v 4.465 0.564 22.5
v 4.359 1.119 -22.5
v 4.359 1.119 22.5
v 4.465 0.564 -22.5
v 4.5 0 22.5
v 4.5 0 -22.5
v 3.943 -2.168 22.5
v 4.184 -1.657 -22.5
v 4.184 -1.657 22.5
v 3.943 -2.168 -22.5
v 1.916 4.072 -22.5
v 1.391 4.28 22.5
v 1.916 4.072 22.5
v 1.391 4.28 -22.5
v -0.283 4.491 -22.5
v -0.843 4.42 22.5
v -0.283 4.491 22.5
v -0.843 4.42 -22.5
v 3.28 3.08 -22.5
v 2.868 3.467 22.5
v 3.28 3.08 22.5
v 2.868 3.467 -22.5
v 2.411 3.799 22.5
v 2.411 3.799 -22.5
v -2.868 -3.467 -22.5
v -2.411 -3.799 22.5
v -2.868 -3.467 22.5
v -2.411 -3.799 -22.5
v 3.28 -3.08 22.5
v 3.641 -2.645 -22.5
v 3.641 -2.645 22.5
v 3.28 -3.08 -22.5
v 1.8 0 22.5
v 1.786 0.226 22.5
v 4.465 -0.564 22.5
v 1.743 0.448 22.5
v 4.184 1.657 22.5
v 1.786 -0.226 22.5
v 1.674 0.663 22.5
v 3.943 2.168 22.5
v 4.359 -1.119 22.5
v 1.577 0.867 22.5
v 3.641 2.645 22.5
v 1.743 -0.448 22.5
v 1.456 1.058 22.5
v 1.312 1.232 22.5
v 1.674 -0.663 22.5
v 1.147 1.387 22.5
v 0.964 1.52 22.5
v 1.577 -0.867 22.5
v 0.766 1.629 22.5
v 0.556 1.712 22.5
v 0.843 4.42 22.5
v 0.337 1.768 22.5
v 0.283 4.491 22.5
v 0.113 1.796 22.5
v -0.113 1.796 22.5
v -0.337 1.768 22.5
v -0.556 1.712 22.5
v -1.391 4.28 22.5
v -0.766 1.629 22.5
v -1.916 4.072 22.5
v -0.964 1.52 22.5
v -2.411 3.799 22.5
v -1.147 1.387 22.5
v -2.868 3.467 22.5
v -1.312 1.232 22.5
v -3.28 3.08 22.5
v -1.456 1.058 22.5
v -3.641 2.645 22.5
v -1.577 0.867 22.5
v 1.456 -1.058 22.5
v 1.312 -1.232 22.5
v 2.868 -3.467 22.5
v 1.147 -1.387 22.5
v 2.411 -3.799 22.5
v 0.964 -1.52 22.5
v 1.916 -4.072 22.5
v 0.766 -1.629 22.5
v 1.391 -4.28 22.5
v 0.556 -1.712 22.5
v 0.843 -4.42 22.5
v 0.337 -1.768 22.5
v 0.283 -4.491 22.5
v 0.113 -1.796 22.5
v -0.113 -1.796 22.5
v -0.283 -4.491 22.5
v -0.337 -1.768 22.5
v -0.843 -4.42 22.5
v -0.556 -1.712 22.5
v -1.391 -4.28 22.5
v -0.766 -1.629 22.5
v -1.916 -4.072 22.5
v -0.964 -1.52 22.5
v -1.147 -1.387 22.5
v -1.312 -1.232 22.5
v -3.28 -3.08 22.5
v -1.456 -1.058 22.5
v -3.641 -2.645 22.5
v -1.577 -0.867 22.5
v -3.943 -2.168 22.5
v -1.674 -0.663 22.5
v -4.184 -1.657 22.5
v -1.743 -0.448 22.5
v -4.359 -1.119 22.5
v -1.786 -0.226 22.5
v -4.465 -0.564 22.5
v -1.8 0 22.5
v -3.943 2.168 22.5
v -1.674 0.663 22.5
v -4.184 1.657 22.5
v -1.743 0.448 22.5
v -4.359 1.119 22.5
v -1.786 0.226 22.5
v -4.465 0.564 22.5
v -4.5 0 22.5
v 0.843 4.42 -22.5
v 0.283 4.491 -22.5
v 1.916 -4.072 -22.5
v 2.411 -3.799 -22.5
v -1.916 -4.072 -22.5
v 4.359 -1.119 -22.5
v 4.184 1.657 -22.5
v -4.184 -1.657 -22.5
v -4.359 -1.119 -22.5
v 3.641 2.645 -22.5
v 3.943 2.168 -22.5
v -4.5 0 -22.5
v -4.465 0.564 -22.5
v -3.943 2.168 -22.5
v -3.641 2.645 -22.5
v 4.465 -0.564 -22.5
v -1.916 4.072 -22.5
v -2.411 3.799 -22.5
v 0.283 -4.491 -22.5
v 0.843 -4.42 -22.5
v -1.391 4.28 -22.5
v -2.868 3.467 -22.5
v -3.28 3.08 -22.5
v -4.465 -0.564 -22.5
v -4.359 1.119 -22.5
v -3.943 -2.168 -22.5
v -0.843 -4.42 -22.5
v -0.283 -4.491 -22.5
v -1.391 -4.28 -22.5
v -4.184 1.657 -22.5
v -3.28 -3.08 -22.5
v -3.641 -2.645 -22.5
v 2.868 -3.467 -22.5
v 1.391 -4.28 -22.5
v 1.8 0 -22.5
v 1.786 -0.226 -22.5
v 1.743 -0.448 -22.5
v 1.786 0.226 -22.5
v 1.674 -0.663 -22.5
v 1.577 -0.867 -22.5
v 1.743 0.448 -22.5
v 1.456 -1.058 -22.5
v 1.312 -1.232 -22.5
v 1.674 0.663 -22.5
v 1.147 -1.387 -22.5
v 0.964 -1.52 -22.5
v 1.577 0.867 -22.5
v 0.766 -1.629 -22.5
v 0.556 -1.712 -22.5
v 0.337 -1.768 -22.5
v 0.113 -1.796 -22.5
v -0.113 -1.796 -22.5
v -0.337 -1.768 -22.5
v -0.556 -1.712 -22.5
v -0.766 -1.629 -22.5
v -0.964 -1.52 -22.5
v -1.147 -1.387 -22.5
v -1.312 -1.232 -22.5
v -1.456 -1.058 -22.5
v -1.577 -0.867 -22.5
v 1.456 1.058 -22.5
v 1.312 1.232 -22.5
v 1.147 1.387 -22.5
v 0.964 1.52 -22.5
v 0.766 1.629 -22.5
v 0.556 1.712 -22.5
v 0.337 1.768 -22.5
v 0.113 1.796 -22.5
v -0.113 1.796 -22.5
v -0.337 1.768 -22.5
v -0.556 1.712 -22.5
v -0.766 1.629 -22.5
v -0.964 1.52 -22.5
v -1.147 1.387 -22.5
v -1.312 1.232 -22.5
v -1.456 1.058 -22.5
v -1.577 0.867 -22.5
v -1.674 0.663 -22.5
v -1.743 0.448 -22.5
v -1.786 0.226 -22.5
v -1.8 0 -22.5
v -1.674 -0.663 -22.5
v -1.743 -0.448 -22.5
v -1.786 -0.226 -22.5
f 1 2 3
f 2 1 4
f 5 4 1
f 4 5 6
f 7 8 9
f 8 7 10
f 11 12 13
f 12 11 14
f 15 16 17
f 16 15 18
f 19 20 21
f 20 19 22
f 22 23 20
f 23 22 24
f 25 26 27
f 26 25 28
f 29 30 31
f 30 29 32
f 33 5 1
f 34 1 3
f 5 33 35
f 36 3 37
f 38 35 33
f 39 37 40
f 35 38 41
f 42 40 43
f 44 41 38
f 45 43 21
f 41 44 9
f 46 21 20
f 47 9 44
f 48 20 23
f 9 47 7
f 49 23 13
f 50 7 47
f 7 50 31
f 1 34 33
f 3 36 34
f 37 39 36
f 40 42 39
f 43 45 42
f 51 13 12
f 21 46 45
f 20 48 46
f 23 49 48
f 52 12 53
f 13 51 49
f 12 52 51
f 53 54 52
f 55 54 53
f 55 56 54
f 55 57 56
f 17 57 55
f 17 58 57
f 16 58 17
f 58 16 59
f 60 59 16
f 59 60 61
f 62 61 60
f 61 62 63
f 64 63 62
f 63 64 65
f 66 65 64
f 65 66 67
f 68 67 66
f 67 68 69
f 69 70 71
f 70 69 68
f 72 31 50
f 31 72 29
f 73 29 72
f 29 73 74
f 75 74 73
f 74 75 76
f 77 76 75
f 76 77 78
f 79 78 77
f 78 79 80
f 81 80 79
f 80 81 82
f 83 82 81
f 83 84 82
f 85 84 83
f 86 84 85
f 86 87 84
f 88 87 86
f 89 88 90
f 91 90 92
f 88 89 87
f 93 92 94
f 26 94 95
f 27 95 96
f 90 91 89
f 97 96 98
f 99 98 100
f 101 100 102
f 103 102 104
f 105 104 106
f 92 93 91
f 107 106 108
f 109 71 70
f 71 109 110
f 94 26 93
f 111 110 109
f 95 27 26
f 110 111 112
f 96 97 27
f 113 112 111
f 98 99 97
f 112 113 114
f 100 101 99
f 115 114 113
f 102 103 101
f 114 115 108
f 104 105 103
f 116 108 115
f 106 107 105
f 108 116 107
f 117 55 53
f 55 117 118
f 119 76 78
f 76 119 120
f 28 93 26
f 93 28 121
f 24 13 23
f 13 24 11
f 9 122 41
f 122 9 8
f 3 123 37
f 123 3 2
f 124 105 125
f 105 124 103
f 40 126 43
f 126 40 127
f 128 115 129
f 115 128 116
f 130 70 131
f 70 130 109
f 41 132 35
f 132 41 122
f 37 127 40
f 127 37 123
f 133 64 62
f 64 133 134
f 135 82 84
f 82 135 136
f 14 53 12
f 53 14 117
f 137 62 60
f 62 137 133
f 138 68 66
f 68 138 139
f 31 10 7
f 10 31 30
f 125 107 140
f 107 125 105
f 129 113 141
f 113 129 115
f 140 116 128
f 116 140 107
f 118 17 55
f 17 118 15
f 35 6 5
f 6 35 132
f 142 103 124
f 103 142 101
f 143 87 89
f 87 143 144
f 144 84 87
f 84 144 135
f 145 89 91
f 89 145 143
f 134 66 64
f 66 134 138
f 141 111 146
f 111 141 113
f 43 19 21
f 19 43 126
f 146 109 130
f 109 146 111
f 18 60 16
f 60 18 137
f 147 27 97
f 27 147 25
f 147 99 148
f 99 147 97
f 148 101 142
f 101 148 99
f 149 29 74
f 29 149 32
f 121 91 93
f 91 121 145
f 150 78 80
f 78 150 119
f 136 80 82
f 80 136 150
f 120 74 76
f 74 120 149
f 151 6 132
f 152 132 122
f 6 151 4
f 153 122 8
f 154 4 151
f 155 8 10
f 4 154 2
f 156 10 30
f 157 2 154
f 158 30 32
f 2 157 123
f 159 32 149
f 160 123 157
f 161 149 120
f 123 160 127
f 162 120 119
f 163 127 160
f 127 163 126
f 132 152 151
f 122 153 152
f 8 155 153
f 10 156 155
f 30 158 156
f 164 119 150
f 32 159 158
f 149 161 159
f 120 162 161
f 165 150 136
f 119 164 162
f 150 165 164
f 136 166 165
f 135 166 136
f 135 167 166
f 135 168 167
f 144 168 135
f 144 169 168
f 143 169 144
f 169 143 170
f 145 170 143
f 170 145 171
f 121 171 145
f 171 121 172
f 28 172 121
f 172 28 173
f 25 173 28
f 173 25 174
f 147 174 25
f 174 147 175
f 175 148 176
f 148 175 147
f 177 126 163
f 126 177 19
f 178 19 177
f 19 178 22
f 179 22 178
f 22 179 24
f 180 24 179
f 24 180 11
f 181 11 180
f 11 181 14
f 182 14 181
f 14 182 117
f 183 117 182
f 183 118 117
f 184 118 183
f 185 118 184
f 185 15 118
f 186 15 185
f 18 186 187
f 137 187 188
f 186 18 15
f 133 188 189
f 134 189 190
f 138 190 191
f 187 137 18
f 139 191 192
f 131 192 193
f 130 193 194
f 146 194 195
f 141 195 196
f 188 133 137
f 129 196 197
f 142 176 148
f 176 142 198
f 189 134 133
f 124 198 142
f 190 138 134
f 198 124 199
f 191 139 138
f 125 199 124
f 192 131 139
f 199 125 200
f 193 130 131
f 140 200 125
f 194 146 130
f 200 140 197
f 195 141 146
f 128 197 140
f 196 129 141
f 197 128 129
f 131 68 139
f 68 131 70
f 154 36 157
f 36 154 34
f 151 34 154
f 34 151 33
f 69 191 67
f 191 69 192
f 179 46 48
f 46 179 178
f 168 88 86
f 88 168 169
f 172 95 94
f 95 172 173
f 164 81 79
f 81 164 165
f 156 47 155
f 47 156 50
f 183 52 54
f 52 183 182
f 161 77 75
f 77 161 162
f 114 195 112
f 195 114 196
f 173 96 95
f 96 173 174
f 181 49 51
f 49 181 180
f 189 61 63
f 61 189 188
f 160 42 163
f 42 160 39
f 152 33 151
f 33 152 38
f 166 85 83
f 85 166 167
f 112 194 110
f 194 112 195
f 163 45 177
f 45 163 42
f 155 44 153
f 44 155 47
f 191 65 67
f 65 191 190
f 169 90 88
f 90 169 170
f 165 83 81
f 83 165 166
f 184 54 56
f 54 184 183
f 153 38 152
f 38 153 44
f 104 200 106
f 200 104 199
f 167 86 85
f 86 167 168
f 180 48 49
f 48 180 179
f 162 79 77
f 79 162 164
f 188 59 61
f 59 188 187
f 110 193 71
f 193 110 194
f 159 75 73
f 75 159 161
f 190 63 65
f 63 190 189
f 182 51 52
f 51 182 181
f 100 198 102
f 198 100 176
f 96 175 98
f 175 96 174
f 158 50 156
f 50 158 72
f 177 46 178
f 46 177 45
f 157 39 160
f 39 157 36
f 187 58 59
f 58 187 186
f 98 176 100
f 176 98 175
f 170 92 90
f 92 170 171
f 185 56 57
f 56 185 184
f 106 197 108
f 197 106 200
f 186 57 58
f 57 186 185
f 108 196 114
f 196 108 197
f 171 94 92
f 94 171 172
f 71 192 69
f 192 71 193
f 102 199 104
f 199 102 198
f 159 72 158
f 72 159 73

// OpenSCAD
$fn = 50;


difference() {
	union() {
		translate(v = [0, 0, -22.5000000000]) {
			cylinder(h = 45, r = 4.5000000000);
		}
	}
	union() {
		#translate(v = [0, 0, -100.0000000000]) {
			cylinder(h = 200, r = 1.8000000000);
		}
	}
}
